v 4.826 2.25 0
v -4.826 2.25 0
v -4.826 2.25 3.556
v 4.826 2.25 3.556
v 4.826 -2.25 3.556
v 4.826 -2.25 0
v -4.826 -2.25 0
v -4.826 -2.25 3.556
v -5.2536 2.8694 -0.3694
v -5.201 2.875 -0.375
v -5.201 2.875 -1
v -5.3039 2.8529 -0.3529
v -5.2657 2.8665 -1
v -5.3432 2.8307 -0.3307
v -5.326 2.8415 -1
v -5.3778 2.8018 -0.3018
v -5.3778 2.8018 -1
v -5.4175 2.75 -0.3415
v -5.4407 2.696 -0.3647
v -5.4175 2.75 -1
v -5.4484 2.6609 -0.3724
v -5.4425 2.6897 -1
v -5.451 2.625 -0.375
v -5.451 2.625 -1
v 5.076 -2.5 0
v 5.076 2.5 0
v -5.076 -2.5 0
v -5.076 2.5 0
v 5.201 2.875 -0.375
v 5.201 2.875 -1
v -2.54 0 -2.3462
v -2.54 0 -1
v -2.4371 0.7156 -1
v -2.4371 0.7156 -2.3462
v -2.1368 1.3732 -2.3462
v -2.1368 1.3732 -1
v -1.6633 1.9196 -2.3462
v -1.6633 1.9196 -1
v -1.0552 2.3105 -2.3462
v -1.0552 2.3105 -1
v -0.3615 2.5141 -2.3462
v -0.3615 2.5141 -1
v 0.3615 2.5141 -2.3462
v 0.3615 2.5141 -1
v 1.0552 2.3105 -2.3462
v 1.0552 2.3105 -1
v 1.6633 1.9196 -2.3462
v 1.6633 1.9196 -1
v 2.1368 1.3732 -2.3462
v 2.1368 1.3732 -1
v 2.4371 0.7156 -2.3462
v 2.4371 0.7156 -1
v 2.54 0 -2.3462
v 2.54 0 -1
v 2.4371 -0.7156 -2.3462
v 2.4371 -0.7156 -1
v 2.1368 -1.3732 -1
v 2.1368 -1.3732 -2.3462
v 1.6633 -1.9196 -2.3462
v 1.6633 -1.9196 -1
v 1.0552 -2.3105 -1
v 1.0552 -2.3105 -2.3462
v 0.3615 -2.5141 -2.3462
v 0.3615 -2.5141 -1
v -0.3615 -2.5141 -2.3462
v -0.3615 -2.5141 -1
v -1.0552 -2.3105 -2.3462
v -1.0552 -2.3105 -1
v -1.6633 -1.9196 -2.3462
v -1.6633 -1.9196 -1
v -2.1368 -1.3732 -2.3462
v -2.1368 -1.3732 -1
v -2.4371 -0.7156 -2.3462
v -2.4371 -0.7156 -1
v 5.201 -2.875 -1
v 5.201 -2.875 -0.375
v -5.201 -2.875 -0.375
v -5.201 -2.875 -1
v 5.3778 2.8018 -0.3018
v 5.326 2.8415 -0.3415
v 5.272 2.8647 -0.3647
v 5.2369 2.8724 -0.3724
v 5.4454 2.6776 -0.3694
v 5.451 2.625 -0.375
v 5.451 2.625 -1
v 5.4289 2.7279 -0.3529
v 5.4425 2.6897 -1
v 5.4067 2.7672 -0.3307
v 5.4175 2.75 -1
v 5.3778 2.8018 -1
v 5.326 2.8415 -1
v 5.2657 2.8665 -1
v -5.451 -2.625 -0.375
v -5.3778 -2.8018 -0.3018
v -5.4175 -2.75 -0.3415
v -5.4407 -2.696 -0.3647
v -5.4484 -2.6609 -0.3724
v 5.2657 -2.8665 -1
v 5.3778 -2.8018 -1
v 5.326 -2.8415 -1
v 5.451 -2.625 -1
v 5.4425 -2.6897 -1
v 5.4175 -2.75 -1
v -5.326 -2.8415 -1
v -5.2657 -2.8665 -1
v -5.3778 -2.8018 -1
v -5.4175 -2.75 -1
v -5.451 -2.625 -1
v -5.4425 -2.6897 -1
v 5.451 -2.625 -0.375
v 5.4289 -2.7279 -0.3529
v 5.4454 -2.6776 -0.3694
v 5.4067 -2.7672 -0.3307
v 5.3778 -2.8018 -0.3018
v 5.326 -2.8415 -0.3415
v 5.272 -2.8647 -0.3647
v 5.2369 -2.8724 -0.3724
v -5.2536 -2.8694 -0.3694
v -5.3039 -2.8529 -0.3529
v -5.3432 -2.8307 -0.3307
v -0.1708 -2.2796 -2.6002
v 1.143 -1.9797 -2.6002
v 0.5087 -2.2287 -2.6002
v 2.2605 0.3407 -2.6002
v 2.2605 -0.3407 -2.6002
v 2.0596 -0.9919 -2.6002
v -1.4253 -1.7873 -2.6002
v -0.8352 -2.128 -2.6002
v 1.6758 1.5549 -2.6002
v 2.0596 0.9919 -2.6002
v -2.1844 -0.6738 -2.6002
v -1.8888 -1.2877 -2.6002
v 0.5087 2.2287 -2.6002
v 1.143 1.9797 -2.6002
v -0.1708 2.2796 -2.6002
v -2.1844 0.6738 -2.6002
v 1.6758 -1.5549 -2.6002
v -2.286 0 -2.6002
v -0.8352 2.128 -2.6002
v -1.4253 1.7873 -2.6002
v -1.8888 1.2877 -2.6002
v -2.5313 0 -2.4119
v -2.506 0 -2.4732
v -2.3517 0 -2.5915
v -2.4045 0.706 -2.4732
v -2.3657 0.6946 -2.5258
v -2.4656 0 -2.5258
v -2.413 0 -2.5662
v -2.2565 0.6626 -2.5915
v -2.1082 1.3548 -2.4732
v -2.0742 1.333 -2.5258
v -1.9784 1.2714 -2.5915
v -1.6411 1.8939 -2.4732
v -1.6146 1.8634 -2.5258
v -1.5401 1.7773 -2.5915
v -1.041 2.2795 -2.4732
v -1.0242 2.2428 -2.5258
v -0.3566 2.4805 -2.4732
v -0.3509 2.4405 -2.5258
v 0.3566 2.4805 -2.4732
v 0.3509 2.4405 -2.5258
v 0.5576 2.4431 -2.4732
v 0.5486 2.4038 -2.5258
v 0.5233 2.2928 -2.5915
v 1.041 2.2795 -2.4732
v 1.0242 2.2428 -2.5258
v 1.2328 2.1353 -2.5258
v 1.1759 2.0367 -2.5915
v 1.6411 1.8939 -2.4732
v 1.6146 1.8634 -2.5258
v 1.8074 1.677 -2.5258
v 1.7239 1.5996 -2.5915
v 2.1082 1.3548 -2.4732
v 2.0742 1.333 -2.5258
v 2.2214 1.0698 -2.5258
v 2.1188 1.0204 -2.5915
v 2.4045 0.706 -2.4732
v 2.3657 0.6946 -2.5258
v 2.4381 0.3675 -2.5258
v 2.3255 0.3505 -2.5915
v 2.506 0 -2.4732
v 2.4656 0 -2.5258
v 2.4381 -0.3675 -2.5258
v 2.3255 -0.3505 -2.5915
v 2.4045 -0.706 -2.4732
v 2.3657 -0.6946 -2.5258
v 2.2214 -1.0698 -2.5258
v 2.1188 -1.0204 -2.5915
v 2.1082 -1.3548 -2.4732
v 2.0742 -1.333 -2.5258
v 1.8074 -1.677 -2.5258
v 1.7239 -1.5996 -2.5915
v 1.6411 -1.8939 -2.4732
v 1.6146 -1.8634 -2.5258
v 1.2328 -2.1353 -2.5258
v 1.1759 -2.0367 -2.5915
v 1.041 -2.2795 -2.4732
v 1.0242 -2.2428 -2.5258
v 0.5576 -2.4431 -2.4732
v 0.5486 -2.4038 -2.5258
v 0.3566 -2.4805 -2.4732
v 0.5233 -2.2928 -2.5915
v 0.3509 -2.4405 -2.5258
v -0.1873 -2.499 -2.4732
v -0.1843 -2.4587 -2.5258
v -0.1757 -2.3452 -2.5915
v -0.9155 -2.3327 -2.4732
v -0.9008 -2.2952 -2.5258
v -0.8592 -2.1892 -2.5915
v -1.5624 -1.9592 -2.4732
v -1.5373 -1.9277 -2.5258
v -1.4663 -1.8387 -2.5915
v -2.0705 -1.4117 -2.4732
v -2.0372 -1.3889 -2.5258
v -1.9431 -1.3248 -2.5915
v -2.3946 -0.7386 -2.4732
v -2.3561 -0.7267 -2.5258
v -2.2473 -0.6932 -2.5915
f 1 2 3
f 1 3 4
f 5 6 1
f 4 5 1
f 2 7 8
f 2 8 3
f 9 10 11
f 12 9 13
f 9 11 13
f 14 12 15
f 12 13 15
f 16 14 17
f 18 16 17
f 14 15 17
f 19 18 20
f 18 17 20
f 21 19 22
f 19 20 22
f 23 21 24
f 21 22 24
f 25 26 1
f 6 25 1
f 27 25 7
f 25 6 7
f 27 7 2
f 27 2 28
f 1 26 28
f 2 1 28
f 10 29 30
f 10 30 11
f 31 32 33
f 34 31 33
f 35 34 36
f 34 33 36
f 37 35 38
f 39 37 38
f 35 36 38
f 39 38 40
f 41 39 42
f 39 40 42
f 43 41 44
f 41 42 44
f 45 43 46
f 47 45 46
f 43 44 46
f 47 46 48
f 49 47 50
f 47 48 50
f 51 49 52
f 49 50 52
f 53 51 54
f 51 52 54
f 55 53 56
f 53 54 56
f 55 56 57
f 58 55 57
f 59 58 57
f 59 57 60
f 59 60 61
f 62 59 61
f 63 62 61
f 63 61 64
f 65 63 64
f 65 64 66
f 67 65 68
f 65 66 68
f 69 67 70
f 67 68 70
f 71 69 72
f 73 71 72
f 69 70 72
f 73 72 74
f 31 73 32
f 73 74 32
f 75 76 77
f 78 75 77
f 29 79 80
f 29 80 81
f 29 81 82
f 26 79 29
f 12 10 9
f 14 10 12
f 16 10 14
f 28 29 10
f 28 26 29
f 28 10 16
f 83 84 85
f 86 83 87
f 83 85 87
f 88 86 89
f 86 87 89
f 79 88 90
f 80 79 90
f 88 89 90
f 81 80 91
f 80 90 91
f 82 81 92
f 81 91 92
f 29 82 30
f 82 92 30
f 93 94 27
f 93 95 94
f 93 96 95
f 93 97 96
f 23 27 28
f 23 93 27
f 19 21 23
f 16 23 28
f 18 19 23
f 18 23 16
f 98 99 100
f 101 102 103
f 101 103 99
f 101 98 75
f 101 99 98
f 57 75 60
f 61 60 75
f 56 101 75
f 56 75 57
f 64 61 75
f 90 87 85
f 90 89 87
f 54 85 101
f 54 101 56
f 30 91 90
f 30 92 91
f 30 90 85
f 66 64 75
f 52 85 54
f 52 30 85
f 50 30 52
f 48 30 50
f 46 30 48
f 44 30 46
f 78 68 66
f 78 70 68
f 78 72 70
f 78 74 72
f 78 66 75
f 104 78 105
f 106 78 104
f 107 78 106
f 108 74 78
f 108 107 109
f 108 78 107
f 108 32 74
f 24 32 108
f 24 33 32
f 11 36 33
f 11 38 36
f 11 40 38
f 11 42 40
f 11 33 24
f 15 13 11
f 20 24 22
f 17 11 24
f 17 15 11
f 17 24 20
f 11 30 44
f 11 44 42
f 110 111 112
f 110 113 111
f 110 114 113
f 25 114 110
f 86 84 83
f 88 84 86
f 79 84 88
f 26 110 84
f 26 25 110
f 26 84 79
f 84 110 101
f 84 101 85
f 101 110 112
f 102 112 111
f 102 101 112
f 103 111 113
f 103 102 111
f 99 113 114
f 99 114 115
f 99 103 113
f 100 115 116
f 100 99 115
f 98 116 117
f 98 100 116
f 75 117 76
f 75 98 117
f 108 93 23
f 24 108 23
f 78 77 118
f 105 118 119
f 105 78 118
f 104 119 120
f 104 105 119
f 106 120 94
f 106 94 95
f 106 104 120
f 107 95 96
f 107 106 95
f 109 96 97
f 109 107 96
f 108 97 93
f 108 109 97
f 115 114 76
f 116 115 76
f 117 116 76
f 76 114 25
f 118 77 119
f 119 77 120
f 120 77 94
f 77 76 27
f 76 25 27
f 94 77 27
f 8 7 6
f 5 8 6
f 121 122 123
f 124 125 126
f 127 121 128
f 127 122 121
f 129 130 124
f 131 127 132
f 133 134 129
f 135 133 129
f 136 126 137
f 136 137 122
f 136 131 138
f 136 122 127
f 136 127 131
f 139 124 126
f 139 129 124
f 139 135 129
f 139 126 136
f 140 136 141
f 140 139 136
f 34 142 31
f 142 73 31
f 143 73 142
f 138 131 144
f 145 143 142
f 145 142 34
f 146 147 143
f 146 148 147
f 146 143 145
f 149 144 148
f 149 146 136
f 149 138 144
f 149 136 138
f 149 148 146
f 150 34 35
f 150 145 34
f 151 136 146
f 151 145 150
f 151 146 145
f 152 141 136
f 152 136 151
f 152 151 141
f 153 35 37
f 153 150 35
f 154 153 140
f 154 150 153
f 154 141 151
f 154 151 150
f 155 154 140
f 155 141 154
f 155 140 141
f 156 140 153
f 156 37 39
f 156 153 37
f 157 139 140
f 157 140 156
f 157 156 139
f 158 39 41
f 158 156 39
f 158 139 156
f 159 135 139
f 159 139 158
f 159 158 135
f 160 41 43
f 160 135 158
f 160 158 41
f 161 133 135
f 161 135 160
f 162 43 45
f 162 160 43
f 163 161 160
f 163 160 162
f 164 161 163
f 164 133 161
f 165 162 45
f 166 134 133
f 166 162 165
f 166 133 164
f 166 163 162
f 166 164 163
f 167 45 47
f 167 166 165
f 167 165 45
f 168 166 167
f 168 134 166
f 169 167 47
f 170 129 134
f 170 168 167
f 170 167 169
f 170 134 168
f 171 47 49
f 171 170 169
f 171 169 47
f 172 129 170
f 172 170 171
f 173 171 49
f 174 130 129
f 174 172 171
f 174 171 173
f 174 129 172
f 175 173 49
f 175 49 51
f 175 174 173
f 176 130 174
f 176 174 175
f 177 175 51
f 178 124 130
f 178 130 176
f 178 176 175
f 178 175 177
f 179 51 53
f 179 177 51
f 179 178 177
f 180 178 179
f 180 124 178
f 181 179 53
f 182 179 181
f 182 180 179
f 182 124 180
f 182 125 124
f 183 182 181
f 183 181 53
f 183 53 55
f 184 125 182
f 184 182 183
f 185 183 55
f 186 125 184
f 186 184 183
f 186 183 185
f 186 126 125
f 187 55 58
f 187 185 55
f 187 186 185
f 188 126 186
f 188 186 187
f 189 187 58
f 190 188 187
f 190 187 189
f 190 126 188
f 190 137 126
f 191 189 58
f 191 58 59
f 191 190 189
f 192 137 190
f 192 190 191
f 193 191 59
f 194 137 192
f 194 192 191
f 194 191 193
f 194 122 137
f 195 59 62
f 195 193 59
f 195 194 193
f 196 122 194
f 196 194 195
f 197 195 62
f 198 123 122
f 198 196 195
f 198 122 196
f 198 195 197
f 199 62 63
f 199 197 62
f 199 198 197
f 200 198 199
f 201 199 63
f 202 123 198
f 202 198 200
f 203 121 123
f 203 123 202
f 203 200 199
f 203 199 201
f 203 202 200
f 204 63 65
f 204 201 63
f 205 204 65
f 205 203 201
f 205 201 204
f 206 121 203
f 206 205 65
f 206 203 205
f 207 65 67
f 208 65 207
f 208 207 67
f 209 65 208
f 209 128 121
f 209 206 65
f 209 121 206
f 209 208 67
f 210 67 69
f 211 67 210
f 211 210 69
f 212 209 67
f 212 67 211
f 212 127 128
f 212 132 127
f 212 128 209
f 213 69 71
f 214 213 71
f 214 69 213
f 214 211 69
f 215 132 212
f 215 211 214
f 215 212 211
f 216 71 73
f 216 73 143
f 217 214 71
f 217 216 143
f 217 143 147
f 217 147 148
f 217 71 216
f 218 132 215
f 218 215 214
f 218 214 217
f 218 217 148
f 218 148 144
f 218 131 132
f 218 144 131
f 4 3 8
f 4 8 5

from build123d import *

# Parameters (mm, degrees)
SKETCH1_W         = 9.652
SKETCH1_H         = 4.5
BUTTON_BASE_DEPTH = 3.556
SKETCH2_W         = 10.9020356
SKETCH2_H         = 5.7500356
GUIDE_DEPTH       = 1
SKETCH3_R         = 2.54
ARM_DEPTH         = 1.6002
CHAMFER1_SIZE     = 0.375
FILLET1_R         = 0.25
FILLET2_R         = 0.254


with BuildPart() as part:
    # Sketch1 → Button Base (new body)
    with BuildSketch(Plane.XY):
        Rectangle(SKETCH1_W, SKETCH1_H)
    extrude(amount=BUTTON_BASE_DEPTH)

    # Sketch2 → Guide (add)
    with BuildSketch(Plane(origin=(0, 0, 0), x_dir=(-1, 0, 0), z_dir=(0, 0, -1))):
        Rectangle(SKETCH2_W, SKETCH2_H)
    extrude(amount=GUIDE_DEPTH)

    # Sketch3 → Arm (add)
    with BuildSketch(Plane(origin=(0, 0, -1), x_dir=(-1, 0, 0), z_dir=(0, 0, -1))):
        Circle(SKETCH3_R)
    extrude(amount=ARM_DEPTH)

    # Chamfer1
    chamfer1_edges = [part.edges().sort_by_distance(p)[0] for p in [
        (0, -2.8750178, 0),
        (-5.4510178, 0, 0),
        (0, 2.8750178, 0),
        (5.4510178, 0, 0),
    ]]
    chamfer(chamfer1_edges, length=CHAMFER1_SIZE)

    # Fillet1
    fillet1_edges = [part.edges().sort_by_distance(p)[0] for p in [
        (5.4510178, -2.8750178, -0.6875),
        (-5.4510178, -2.8750178, -0.6875),
        (-5.4510178, 2.8750178, -0.6875),
        (5.4510178, 2.8750178, -0.6875),
    ]]
    fillet(fillet1_edges, radius=FILLET1_R)

    # Fillet2
    fillet2_edges = [part.edges().sort_by_distance(p)[0] for p in [
        (2.54, 0, -2.6002),
    ]]
    fillet(fillet2_edges, radius=FILLET2_R)


solid = part.part
